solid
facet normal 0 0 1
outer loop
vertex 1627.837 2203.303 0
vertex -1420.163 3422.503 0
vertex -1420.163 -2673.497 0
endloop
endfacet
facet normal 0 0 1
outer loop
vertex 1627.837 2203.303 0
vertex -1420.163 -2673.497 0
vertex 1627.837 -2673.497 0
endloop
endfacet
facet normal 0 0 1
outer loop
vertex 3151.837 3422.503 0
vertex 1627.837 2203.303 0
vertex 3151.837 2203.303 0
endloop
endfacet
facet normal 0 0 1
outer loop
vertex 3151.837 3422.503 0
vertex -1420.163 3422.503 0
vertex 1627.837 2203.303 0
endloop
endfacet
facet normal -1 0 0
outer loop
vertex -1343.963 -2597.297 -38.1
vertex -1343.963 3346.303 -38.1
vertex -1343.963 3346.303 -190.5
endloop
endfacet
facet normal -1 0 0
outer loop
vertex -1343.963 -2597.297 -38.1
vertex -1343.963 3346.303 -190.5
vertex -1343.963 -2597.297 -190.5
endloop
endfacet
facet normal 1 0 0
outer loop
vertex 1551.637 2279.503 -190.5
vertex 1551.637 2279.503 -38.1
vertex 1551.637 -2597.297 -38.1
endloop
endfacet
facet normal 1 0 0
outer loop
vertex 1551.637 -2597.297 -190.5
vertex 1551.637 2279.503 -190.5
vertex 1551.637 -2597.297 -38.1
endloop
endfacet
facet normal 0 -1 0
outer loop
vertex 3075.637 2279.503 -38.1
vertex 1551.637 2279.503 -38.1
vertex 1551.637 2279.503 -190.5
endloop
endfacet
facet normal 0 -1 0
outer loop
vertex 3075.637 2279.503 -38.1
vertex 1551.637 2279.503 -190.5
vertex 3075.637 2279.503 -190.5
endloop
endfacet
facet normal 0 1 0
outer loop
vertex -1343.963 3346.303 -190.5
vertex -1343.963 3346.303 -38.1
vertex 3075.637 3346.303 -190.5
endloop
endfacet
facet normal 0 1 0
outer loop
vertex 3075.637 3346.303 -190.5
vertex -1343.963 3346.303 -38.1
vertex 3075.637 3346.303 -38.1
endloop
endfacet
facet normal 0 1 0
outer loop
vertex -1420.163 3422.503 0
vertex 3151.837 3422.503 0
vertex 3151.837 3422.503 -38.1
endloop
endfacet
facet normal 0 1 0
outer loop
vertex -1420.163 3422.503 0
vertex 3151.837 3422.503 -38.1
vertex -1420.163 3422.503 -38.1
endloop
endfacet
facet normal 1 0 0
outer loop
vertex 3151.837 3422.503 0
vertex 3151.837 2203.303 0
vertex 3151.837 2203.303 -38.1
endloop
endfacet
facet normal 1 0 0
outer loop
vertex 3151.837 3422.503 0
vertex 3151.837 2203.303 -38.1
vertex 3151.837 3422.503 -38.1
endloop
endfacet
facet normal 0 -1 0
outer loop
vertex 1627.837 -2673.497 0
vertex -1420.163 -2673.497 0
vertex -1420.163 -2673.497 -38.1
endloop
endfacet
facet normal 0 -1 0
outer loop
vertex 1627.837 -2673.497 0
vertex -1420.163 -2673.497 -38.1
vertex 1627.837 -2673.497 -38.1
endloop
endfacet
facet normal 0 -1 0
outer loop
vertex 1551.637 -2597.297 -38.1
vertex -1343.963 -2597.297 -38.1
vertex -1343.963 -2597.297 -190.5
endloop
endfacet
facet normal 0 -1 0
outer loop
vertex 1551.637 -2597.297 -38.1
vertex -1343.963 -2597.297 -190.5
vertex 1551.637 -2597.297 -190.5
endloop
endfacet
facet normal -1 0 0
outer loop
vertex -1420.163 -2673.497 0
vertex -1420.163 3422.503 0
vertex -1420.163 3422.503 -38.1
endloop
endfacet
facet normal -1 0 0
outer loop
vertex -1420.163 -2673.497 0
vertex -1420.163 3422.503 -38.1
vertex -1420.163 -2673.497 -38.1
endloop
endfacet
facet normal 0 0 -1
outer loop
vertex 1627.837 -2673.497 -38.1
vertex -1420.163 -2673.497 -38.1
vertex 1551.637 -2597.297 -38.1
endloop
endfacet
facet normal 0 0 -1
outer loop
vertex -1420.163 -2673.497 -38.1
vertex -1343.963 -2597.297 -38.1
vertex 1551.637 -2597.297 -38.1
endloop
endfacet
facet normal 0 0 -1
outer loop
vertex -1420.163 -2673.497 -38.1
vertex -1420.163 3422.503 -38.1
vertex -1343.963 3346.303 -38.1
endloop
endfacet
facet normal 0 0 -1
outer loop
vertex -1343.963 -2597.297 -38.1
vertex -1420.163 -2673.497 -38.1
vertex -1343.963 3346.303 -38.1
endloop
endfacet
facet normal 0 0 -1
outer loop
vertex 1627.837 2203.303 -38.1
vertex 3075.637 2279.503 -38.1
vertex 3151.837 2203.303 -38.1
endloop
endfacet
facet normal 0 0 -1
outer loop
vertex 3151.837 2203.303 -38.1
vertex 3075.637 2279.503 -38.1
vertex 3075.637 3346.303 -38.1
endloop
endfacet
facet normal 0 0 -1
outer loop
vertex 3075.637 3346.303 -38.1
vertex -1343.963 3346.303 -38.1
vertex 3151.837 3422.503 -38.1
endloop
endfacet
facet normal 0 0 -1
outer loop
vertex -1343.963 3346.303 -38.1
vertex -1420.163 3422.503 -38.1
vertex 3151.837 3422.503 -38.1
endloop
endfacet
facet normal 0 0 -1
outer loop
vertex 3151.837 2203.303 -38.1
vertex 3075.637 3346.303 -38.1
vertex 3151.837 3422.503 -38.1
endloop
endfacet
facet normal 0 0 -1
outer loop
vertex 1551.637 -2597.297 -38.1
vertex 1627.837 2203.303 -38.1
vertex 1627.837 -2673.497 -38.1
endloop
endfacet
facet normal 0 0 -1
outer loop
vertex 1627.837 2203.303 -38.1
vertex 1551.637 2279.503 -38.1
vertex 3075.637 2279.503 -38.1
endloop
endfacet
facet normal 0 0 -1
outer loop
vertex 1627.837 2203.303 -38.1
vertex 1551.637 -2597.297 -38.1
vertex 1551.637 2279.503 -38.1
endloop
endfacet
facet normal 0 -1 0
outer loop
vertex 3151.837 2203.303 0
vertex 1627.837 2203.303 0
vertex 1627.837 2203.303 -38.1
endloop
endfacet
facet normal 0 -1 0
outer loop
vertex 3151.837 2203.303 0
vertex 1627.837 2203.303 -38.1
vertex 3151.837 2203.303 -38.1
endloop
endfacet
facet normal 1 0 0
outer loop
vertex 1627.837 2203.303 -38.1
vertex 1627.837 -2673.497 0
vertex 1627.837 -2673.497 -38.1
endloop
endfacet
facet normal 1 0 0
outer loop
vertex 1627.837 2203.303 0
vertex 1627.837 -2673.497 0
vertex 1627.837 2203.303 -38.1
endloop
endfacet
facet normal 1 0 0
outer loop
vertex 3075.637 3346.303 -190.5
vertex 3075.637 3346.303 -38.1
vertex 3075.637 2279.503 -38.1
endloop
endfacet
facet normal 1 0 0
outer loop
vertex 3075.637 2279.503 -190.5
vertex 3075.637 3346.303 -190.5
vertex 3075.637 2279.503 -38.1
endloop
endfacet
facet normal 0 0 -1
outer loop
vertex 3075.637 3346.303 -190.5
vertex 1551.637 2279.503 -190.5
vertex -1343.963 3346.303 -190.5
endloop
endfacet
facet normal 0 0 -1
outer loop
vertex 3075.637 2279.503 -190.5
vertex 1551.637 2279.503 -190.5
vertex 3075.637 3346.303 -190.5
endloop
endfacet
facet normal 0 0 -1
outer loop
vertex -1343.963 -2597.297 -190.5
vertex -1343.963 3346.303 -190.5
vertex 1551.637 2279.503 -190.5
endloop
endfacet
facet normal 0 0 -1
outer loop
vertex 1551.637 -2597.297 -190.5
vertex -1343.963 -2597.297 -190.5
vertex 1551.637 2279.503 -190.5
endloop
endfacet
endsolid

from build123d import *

# Parameters (mm, degrees)
F1_DEPTH = 38.1
F2_W     = 2895.6
F2_H     = 5943.6
F3_DEPTH = 152.4
F4_W     = 1524
F4_H     = 1066.8
F5_DEPTH = 152.4


with BuildPart() as f1:
    # F0 (on Top) → F1 (new body)
    with BuildSketch(Plane.XY):
        Polygon((3151.836924, 3422.502622), (-1420.163076, 3422.502622), (-1420.163076, -2673.497378), (1627.836924, -2673.497378), (1627.836924, 2203.302622), (3151.836924, 2203.302622), align=None)
    extrude(amount=-F1_DEPTH)

    # F2 (on face) → F3 (join)
    with BuildSketch(Plane(origin=(0, 0, -38.1), x_dir=(1, 0, 0), z_dir=(0, 0, -1))):
        with Locations((103.836924, -374.502622)):
            Rectangle(F2_W, F2_H)
    extrude(amount=F3_DEPTH)

    # F4 (on face) → F5 (join)
    with BuildSketch(Plane(origin=(0, 0, -38.1), x_dir=(1, 0, 0), z_dir=(0, 0, -1))):
        with Locations((2313.636924, -2812.902622)):
            Rectangle(F4_W, F4_H)
    extrude(amount=F5_DEPTH)


solid = f1.part
